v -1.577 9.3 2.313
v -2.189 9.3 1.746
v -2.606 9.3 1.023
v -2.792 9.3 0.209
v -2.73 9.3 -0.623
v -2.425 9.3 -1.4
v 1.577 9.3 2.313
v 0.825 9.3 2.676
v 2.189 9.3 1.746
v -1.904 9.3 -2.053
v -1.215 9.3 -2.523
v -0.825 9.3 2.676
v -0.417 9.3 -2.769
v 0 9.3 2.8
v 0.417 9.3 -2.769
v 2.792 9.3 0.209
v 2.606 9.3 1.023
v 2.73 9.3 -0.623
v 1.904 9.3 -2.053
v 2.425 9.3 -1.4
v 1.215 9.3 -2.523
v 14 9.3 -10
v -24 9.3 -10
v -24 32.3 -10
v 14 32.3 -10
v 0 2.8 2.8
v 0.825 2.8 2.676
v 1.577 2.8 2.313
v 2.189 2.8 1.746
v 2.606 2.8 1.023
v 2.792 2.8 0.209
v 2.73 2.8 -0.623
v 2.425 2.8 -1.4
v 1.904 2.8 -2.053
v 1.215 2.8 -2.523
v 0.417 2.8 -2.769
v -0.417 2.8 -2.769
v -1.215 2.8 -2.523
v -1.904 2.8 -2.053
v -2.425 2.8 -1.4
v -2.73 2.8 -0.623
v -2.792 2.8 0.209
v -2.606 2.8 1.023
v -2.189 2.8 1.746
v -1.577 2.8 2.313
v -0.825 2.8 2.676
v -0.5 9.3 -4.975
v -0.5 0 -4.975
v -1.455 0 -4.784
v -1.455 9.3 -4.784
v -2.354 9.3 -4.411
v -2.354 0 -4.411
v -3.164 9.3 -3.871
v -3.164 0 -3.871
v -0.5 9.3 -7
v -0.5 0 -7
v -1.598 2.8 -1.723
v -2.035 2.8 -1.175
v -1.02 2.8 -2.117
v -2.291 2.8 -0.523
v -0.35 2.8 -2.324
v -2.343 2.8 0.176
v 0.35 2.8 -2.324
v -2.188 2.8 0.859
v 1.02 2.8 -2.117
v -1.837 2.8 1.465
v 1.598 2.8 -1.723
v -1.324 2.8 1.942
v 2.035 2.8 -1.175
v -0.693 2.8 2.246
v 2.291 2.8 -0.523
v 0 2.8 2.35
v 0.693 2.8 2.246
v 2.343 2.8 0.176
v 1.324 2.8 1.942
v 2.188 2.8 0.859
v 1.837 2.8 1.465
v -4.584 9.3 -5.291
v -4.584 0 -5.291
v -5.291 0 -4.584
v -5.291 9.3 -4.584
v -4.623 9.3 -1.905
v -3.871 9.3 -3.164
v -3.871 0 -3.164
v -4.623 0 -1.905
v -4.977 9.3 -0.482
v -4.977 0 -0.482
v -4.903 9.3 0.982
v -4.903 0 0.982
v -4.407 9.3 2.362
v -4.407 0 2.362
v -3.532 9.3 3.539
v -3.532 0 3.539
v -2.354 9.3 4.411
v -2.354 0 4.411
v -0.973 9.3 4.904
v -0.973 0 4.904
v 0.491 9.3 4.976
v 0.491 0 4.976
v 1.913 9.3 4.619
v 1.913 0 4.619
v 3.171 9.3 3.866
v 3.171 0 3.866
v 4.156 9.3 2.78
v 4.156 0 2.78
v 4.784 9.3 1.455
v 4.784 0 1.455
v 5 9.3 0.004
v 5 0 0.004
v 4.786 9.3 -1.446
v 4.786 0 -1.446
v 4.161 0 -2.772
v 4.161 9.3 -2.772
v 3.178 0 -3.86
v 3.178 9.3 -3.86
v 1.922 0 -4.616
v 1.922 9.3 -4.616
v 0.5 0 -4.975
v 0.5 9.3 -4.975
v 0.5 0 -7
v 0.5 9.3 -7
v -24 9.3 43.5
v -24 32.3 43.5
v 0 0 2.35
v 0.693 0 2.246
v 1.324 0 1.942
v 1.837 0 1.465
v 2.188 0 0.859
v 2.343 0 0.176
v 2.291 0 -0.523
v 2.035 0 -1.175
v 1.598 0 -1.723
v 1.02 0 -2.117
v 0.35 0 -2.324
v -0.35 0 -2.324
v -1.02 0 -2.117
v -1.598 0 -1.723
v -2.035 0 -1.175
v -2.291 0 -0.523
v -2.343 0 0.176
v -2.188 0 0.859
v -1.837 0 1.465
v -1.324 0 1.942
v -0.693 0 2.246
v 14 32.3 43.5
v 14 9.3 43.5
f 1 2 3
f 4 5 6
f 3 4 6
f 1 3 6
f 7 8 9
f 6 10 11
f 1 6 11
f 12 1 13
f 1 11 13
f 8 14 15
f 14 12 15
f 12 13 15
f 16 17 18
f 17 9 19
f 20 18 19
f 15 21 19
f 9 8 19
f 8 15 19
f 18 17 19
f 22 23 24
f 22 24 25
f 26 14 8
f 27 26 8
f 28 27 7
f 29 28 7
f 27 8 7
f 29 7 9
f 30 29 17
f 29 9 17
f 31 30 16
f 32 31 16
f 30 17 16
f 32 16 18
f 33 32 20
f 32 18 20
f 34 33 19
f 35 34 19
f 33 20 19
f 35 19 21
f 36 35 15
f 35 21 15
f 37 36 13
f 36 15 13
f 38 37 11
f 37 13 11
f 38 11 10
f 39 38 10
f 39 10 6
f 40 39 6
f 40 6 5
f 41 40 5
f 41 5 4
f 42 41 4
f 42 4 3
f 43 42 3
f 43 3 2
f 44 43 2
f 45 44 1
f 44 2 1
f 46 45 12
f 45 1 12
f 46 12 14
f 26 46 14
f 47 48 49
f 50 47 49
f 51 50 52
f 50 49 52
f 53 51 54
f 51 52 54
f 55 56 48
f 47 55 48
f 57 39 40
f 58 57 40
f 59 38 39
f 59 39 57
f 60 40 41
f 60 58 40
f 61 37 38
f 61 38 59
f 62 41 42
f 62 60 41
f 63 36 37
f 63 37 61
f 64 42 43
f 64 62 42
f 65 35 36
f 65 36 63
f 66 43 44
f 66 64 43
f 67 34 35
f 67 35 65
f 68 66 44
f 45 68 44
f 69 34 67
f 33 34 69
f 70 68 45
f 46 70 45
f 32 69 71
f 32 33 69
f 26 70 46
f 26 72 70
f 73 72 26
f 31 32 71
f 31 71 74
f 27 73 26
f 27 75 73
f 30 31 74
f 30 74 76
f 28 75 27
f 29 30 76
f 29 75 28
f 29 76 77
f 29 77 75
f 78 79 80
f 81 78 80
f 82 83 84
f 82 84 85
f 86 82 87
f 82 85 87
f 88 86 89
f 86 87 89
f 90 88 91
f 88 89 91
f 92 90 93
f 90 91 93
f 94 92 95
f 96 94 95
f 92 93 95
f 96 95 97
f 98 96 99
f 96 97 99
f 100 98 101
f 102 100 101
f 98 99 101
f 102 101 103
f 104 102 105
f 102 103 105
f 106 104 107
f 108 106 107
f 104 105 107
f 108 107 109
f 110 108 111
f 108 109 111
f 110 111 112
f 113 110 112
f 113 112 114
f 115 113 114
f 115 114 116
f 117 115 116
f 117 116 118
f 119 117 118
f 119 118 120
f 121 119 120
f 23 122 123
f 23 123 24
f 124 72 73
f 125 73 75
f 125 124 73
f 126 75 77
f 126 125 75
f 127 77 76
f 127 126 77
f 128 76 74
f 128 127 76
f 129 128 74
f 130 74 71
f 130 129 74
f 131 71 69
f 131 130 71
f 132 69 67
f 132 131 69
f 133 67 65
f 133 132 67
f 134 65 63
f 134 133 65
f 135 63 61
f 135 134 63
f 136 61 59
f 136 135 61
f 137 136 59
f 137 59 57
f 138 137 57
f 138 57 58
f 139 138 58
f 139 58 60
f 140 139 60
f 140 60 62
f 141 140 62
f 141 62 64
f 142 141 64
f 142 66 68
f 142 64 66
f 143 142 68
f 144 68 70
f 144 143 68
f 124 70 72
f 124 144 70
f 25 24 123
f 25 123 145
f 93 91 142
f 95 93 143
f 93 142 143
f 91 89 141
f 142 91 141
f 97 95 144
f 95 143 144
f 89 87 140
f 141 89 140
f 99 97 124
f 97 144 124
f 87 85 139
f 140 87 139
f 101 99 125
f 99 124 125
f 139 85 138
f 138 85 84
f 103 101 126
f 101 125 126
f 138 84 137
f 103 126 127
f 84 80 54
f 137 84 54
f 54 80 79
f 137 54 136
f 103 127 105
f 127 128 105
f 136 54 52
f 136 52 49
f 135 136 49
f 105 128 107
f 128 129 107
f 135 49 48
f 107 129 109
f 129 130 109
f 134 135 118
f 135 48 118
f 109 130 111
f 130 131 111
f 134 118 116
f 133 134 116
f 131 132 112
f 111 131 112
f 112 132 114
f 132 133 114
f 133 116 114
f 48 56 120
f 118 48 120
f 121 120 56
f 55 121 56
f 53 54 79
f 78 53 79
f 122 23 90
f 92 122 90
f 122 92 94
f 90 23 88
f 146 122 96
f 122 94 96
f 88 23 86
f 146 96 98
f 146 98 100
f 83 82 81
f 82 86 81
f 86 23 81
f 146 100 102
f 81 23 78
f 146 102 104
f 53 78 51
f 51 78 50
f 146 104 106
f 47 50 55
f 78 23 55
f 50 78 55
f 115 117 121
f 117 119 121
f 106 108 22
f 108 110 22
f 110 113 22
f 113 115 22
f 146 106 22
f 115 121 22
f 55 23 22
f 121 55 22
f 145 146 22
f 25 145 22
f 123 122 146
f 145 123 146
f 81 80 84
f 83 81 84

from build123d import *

# Parameters (mm, degrees)
SKETCH1_R           = 2.35
BOSS_EXTRUDE1_DEPTH = 9.3
SKETCH2_R           = 2.8
CUT_EXTRUDE1_DEPTH  = 6.5
SKETCH3_W           = 38
SKETCH3_H           = 53.5
BOSS_EXTRUDE2_DEPTH = 23


with BuildPart() as part:
    # Sketch1 → Boss-Extrude1 (new body)
    with BuildSketch(Plane(origin=(0, 0, 0), x_dir=(1, 0, 0), z_dir=(0, 1, 0))):
        with BuildLine():
            Line((-0.5, 7), (-0.5, 4.974937186))
            ThreePointArc((-0.5, 4.974937186), (-1.913417162, 4.619397663), (-3.164258429, 3.87136521))
            Line((-3.164258429, 3.87136521), (-4.583551024, 5.290657805))
            Line((-4.583551024, 5.290657805), (-5.290657805, 4.583551024))
            Line((-5.290657805, 4.583551024), (-3.87136521, 3.164258429))
            ThreePointArc((-3.87136521, 3.164258429), (1.913417162, -4.619397663), (0.5, 4.974937186))
            Line((0.5, 4.974937186), (0.5, 7))
            Line((0.5, 7), (-0.5, 7))
        make_face()
        with Locations(Location((0, 0, 0), (0, 0, 270))):
            Circle(SKETCH1_R, mode=Mode.SUBTRACT)
    extrude(amount=BOSS_EXTRUDE1_DEPTH)

    # Sketch2 → Cut-Extrude1 (cut)
    with BuildSketch(Plane(origin=(0, 9.3, 0), x_dir=(1, 0, 0), z_dir=(0, 1, 0))):
        with Locations(Location((0, 0, 0), (0, 0, 270))):
            Circle(SKETCH2_R)
    extrude(amount=-CUT_EXTRUDE1_DEPTH, mode=Mode.SUBTRACT)

    # Sketch3 → Boss-Extrude2 (add)
    with BuildSketch(Plane(origin=(0, 9.3, 0), x_dir=(1, 0, 0), z_dir=(0, 1, 0))):
        with Locations((-5, -16.75)):
            Rectangle(SKETCH3_W, SKETCH3_H)
    extrude(amount=BOSS_EXTRUDE2_DEPTH)


solid = part.part
